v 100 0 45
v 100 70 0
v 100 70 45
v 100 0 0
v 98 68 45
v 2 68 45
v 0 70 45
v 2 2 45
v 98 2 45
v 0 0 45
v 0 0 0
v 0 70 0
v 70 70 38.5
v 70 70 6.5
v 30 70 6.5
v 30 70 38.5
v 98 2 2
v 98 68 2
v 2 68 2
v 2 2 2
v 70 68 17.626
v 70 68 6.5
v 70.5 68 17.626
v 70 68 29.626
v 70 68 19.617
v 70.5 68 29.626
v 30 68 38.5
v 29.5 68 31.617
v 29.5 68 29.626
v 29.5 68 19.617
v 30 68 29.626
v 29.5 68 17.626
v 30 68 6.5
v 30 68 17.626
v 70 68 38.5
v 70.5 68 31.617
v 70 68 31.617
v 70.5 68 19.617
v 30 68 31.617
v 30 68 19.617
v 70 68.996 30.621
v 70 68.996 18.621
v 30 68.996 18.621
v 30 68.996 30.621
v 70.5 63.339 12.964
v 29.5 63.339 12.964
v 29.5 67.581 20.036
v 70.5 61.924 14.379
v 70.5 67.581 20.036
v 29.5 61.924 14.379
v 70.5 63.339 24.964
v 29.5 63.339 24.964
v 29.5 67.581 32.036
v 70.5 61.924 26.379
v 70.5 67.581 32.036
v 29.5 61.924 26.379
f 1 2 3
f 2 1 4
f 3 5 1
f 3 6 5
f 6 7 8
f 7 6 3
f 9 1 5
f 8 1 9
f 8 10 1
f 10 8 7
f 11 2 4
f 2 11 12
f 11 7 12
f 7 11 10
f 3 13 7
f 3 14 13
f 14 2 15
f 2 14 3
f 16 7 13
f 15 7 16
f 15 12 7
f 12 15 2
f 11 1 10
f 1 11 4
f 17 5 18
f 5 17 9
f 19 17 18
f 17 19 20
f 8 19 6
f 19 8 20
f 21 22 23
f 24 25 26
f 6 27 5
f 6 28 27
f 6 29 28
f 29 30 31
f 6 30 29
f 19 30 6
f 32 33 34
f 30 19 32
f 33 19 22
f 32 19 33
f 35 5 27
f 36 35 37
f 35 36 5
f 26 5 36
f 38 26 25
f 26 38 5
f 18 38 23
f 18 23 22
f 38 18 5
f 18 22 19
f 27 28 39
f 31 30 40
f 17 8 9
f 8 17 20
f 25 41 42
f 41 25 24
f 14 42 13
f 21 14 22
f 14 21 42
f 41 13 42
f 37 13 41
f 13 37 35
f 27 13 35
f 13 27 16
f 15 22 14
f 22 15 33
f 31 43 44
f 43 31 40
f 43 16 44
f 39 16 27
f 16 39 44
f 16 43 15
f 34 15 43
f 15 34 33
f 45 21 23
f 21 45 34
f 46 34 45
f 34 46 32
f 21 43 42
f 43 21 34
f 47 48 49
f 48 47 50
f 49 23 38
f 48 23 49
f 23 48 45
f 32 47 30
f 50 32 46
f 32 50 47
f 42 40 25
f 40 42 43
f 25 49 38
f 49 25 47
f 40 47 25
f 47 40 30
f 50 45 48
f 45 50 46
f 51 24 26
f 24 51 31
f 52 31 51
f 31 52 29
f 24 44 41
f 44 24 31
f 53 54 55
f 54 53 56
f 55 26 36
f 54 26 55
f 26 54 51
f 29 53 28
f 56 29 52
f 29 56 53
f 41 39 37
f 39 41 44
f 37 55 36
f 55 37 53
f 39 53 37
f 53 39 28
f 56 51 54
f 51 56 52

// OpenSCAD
$fn = 32;

// ----------------------------------------------------------------------
// Vent box: louvers enclosure
// ----------------------------------------------------------------------

// --- parameters (mm) ---
box_l = 100;              // box length, X
box_w = 70;               // box width, Y
box_h = 45;               // box height, Z
wall_t = 2;               // shell wall thickness
win_l = 40;               // vent window width, X
win_h = 32;               // vent window height, Z
slat_t = 2;               // louver slat thickness
slat_d = 8;               // louver slat depth
slat_a = 45;              // louver slat angle, degrees
slat_pitch = 12;          // louver pitch
slat_yc = 65.46;          // slat centreline Y
fit_tol = 0.05;           // tolerance for press fits, mm
free_tol = 0.2;           // tolerance for clearance fits, mm

win_z0 = (box_h - win_h) / 2;  // window lower edge Z
n_slats = 2;  // louver count
slat_z0 = win_z0 + (win_h - (n_slats - 1) * slat_pitch) / 2;

difference() {
  union() {
    difference() {
      cube([box_l, box_w, box_h]);
  translate([wall_t, wall_t, wall_t])
    cube([box_l - 2 * wall_t, box_w - 2 * wall_t, box_h]);
  translate([(box_l - win_l) / 2, box_w - wall_t - 1, win_z0])
    cube([win_l, wall_t + 2, win_h]);
    }
    for (i = [0 : n_slats - 1])
      translate([box_l / 2, slat_yc, slat_z0 + i * slat_pitch])
        rotate([slat_a, 0, 0])
          cube([win_l + 1, slat_d, slat_t], center = true);
  }
}
